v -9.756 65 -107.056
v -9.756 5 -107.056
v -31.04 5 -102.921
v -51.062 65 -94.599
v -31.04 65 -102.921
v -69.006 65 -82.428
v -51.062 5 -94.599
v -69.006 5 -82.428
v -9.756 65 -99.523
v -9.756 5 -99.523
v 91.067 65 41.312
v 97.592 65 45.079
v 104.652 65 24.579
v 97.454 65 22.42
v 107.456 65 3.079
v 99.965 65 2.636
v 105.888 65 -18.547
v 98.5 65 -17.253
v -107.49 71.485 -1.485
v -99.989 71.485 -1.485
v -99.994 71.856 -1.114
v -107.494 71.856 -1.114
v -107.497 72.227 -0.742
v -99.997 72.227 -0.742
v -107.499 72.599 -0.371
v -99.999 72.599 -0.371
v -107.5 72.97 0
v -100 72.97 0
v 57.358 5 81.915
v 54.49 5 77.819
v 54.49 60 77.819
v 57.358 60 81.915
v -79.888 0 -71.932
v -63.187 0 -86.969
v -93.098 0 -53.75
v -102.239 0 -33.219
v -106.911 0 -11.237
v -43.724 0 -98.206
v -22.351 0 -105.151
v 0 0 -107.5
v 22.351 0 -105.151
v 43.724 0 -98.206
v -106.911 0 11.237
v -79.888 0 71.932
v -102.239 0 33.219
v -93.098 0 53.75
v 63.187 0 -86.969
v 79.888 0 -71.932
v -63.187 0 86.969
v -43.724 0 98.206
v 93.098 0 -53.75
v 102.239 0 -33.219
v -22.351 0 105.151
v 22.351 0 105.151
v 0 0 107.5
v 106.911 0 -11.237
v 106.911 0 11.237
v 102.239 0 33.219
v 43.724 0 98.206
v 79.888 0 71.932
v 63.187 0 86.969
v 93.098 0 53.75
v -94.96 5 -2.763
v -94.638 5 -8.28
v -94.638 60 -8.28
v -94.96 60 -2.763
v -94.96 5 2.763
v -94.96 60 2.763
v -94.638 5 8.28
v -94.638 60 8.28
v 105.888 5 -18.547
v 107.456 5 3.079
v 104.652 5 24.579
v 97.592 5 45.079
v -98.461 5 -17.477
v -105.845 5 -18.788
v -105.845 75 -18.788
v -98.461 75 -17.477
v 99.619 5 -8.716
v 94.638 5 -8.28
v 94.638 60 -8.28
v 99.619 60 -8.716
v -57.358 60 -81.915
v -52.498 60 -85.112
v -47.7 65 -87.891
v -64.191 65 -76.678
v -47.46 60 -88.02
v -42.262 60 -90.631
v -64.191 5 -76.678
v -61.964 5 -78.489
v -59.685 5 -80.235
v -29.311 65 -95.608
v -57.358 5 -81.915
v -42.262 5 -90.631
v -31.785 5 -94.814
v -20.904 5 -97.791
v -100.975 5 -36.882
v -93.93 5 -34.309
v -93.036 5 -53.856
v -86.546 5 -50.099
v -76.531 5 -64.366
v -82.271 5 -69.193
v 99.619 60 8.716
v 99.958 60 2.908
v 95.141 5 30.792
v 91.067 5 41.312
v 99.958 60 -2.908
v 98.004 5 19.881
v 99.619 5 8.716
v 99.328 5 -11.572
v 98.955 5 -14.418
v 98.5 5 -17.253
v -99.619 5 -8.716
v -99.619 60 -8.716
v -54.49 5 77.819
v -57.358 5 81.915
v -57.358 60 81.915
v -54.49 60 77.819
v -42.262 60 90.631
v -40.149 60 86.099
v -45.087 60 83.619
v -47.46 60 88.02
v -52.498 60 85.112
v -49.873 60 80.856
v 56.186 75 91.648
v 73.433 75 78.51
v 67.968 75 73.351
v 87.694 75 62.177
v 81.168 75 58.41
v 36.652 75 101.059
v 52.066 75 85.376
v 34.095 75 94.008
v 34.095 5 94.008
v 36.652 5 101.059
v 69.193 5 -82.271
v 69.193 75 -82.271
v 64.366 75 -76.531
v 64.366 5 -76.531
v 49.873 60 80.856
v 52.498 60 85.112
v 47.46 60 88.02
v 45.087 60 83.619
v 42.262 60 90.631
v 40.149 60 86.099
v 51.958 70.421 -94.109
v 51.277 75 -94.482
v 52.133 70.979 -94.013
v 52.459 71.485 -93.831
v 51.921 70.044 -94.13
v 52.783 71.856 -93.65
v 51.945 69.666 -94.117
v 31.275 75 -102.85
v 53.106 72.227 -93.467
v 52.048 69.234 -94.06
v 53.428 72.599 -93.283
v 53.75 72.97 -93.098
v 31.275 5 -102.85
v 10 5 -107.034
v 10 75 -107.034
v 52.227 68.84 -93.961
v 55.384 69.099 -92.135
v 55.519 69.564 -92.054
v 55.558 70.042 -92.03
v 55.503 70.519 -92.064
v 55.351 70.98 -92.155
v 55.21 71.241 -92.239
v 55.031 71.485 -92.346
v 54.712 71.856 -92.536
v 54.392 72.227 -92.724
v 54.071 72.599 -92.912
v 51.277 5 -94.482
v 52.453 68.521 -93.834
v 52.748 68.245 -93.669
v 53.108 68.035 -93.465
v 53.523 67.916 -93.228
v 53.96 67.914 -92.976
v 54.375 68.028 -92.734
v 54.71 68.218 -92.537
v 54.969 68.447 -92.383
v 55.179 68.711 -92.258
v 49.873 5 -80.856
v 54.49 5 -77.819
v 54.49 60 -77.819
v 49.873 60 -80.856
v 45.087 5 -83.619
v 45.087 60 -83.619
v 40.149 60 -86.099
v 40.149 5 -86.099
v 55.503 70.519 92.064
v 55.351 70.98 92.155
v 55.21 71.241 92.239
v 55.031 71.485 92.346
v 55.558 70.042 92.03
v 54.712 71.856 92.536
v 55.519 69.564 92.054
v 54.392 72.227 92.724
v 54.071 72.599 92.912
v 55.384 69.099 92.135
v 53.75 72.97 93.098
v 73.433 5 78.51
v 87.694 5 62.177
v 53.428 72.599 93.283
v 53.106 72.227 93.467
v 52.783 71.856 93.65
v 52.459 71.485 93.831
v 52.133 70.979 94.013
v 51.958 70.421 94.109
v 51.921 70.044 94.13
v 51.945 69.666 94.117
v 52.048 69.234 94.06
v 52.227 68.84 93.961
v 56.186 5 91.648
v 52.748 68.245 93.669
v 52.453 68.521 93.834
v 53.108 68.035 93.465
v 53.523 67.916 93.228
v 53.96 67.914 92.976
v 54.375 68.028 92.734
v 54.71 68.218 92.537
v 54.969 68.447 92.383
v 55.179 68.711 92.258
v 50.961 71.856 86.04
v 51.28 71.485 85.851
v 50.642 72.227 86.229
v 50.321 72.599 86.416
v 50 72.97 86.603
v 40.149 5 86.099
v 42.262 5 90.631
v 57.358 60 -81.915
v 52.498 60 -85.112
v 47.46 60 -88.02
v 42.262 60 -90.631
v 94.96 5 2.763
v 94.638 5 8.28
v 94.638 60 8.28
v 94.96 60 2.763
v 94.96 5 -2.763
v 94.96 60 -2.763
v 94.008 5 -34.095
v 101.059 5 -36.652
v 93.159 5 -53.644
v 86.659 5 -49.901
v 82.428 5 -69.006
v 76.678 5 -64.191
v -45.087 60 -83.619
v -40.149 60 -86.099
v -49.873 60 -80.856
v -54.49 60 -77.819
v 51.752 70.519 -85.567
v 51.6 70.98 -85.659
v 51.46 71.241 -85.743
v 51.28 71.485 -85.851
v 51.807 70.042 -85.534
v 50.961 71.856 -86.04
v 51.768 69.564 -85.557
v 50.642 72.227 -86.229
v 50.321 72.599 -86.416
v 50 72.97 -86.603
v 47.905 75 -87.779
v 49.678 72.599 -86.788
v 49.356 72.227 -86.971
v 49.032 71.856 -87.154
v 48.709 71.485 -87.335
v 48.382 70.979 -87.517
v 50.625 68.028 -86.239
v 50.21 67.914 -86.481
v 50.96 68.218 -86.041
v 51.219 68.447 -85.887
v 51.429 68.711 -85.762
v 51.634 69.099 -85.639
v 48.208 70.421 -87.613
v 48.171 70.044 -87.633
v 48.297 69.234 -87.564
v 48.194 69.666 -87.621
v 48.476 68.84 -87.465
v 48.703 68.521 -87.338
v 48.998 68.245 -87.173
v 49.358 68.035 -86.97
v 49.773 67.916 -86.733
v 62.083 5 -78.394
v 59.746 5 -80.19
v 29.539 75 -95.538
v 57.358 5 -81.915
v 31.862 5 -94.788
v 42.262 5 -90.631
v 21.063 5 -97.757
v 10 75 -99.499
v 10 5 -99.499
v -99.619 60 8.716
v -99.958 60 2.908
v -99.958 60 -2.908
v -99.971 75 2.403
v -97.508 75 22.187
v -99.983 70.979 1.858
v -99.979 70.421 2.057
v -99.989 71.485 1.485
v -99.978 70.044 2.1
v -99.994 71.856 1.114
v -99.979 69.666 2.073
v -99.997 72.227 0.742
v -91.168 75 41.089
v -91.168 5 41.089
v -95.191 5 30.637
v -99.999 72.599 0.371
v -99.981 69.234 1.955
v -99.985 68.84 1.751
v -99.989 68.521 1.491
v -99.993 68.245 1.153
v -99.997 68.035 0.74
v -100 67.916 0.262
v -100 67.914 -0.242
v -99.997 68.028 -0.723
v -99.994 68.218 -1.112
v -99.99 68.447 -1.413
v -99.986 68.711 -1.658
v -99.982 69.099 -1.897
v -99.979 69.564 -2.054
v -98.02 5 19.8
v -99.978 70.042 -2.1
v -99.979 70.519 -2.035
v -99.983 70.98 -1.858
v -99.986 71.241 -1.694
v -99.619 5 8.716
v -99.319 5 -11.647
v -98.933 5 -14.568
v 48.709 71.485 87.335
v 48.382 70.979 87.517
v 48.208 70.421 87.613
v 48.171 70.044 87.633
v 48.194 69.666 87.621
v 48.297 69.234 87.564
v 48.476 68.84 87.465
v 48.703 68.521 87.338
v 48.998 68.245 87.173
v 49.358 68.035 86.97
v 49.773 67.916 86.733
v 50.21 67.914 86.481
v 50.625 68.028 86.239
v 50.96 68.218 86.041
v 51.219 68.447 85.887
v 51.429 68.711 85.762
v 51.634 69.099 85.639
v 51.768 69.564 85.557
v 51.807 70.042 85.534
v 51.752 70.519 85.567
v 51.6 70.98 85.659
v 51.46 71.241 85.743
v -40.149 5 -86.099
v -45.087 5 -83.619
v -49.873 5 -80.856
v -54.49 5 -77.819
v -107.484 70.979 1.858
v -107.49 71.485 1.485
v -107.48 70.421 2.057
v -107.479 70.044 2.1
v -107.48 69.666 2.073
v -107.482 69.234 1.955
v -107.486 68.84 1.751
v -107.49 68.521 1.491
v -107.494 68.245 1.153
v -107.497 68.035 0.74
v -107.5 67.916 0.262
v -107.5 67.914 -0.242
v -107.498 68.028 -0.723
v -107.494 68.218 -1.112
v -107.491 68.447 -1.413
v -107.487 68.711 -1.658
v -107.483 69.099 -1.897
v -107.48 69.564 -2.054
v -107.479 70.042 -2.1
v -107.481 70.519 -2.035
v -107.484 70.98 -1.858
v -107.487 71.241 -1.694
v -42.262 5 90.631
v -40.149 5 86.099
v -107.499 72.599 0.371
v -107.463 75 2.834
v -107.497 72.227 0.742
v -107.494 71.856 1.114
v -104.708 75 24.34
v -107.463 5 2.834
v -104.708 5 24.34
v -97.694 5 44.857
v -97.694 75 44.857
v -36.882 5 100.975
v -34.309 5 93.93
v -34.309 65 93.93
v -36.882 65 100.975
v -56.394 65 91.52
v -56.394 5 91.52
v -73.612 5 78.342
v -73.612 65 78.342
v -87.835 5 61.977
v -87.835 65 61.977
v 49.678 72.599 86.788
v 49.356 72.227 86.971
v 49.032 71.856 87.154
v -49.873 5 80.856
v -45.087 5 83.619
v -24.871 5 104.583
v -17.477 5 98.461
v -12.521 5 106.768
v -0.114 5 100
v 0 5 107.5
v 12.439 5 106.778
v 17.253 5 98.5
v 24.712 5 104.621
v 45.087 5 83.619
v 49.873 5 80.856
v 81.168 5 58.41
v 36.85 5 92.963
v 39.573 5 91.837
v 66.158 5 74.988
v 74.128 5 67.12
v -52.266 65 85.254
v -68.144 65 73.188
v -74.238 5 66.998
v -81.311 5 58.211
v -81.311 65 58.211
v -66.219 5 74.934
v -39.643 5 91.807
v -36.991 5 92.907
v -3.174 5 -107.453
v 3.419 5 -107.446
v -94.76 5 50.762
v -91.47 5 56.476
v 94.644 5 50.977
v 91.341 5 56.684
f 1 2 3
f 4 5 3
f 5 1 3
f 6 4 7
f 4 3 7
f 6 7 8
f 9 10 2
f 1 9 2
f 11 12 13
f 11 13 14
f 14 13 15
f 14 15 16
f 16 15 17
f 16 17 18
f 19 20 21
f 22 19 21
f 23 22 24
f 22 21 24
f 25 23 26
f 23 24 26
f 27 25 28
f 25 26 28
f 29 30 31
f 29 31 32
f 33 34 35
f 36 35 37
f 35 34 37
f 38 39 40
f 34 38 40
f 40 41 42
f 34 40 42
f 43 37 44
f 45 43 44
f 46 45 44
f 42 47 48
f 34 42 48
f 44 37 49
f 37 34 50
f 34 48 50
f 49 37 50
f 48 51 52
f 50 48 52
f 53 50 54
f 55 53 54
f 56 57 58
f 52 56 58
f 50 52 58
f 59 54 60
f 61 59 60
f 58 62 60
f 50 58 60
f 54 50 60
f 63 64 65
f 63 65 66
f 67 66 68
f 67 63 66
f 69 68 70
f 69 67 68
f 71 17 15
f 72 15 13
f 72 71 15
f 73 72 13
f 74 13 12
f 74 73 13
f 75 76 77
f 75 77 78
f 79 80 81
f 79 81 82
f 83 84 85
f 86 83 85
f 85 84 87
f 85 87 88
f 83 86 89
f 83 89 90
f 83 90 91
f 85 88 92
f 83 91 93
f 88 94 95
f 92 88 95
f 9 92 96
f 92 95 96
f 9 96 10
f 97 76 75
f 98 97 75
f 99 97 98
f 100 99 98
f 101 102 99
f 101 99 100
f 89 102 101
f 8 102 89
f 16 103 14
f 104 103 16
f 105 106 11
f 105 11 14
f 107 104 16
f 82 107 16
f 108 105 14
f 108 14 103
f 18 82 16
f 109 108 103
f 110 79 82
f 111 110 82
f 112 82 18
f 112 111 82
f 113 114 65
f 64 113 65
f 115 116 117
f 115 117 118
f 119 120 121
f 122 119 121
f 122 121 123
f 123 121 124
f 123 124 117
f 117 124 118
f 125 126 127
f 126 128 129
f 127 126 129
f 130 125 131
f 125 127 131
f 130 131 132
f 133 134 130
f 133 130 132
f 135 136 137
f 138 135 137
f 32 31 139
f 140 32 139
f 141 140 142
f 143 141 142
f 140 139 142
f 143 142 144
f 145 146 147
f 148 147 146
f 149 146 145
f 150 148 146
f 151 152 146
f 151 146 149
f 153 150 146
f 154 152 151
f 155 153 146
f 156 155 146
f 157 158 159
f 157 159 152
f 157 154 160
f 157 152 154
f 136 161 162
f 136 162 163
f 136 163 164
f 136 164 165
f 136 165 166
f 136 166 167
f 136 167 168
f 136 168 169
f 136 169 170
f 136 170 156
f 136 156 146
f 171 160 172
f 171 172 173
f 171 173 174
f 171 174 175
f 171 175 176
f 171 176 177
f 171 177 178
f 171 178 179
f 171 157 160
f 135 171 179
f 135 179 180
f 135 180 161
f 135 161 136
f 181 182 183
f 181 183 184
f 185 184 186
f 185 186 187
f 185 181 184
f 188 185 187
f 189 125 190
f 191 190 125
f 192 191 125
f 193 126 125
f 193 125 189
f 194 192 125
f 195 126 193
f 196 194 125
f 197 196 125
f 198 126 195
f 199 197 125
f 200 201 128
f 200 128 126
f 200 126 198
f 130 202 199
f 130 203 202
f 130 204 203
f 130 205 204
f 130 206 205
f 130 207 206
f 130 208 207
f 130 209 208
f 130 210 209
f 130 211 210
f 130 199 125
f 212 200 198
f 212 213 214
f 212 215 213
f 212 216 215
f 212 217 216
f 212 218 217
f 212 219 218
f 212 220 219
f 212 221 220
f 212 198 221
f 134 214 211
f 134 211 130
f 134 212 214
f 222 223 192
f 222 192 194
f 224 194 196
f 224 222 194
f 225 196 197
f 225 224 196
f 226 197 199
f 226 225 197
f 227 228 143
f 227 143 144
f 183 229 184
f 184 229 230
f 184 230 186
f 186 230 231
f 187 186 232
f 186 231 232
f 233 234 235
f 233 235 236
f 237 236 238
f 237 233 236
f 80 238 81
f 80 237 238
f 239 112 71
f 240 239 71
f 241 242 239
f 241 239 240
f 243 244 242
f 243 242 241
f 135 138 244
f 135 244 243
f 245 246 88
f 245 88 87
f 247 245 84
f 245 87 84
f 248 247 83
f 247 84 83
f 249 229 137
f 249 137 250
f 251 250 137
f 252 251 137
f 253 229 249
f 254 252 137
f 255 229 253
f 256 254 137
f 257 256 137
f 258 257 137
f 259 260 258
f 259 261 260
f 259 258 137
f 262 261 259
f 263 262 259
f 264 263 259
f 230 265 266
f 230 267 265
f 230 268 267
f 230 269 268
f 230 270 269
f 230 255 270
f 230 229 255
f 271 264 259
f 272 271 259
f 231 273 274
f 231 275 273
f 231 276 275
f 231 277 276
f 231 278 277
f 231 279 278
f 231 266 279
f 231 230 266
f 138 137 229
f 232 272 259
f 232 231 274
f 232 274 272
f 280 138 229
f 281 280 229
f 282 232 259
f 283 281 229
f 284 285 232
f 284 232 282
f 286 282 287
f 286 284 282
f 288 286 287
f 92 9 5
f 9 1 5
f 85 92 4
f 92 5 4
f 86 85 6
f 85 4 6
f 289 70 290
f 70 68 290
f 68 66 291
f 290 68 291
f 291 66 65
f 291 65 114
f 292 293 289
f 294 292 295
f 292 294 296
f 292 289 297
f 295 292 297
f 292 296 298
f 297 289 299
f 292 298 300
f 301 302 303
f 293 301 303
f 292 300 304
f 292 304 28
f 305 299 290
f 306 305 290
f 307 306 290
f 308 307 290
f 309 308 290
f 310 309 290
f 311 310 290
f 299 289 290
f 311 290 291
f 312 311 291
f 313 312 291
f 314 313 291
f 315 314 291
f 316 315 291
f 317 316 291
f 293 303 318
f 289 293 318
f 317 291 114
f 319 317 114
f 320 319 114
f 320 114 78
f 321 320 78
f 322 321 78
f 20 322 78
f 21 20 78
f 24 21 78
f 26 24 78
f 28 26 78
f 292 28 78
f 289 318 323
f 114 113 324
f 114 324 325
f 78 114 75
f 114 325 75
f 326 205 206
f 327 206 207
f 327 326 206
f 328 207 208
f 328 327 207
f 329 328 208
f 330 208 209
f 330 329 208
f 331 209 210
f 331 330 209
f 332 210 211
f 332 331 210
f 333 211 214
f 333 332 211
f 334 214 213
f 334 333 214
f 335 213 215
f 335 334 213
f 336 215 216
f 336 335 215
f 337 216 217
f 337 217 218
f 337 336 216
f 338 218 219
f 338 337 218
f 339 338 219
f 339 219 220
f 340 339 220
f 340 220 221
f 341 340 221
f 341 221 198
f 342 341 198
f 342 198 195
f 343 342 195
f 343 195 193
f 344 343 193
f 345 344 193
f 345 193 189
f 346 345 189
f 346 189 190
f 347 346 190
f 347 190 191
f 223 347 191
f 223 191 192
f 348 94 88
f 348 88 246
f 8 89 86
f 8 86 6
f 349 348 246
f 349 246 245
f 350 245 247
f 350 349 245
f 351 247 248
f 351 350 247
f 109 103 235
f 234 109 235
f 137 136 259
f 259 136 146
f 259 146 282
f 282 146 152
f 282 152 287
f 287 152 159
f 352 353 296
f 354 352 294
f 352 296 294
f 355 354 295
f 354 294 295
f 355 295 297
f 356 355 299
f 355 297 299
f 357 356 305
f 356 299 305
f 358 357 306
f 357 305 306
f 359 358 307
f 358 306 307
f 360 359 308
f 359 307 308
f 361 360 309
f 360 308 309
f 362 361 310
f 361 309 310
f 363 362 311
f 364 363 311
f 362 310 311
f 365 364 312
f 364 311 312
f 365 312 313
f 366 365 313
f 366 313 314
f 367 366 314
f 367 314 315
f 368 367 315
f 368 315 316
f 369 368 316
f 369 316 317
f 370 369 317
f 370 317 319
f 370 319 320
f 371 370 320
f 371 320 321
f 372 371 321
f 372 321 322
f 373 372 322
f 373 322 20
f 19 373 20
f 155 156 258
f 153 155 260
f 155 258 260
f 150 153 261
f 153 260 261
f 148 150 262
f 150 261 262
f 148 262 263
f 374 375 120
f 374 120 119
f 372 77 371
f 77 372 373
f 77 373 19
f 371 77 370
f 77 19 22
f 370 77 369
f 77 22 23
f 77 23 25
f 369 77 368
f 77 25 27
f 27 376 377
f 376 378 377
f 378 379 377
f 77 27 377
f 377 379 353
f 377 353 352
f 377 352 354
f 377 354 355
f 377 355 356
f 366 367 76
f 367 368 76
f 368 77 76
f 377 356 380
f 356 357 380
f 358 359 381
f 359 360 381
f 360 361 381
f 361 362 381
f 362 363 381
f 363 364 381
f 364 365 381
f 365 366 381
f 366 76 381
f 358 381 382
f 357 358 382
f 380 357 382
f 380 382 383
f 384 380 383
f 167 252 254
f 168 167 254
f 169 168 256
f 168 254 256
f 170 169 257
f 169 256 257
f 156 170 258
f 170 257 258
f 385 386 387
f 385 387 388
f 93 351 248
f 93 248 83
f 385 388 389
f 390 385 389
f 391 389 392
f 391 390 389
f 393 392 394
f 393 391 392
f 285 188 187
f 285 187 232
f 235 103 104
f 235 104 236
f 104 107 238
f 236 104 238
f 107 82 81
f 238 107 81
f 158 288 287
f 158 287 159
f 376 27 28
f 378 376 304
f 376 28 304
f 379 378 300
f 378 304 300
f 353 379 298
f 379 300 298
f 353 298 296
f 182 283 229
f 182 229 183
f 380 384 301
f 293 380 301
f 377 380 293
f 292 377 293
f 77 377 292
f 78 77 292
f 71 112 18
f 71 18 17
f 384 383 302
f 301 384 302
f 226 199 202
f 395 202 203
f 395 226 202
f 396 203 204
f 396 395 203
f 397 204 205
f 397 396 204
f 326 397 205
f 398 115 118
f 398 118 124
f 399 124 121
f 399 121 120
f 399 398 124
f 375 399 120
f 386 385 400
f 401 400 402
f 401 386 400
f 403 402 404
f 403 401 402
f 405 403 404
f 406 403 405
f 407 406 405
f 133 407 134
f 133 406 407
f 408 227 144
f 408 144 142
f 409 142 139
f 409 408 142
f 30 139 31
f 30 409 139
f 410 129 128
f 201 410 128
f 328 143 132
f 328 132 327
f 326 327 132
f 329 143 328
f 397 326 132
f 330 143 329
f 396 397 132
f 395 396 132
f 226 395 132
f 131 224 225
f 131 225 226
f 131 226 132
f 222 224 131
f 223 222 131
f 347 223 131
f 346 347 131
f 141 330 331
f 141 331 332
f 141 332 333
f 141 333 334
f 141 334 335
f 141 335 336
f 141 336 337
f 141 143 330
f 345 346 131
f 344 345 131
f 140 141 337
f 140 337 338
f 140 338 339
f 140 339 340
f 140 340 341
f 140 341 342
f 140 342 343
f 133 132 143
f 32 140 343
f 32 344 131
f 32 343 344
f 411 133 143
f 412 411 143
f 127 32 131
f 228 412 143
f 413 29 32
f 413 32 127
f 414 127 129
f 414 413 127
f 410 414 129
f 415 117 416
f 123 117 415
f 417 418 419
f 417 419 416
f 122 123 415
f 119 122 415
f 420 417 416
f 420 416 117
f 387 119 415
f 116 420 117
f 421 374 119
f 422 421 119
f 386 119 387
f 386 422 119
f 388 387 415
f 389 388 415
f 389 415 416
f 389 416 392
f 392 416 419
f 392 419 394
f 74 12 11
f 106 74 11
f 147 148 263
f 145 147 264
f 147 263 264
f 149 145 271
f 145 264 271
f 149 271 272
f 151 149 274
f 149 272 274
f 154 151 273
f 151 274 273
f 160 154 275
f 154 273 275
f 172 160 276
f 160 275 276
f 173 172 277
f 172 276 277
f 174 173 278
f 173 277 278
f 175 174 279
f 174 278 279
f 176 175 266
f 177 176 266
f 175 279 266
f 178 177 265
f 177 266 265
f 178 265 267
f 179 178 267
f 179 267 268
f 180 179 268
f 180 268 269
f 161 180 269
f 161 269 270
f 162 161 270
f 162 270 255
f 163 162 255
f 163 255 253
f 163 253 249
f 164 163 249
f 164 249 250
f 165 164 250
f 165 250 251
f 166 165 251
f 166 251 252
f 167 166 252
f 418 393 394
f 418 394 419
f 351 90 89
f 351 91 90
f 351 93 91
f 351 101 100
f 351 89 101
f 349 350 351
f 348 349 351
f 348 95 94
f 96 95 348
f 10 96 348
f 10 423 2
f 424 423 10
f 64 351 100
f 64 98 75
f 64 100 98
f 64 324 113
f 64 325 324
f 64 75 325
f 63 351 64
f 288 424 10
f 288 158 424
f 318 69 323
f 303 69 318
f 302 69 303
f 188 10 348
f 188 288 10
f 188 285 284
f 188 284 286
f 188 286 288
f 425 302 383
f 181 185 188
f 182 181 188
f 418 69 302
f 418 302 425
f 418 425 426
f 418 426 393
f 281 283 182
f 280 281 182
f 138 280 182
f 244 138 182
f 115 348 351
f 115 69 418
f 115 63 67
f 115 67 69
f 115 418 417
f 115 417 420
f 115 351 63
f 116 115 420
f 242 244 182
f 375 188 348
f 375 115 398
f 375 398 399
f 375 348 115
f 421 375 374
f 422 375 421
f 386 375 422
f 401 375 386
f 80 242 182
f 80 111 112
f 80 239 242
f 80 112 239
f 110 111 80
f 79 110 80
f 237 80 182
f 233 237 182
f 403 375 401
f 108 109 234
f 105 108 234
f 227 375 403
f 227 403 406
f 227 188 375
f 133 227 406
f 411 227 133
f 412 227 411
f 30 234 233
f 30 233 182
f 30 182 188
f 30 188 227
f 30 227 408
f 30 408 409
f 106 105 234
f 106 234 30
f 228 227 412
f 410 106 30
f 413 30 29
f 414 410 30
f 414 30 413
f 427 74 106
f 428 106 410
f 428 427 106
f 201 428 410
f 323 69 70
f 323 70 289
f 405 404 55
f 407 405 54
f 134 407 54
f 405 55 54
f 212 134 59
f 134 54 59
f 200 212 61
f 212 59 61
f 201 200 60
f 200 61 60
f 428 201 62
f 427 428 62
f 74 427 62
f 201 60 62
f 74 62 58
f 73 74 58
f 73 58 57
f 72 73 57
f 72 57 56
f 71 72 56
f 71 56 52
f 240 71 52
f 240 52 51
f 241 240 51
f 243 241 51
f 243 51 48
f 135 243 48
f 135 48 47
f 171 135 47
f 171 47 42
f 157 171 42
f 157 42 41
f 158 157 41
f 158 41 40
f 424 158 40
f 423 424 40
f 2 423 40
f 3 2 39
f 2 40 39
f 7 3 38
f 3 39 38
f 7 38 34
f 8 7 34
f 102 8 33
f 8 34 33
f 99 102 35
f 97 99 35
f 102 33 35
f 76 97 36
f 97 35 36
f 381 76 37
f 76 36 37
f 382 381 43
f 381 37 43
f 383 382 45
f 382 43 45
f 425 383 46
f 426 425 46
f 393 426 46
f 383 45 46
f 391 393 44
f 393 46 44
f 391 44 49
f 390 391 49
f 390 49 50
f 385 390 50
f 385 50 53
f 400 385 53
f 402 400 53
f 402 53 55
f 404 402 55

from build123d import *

# Parameters (mm, degrees)
SKETCH1_R               = 107.5
BOSS_EXTRUDE1_DEPTH     = 5
BOSS_EXTRUDE2_DEPTH     = 70
CUT_EXTRUDE2_DEPTH      = 10
CUT_EXTRUDE2_DEPTH_BACK = 10
BOSS_EXTRUDE4_DEPTH     = 55
CUT_EXTRUDE3_DEPTH      = 10
CUT_EXTRUDE3_DEPTH_BACK = 10
CUT_EXTRUDE4_DEPTH      = 10
CUT_EXTRUDE4_DEPTH_BACK = 10
CUT_EXTRUDE5_DEPTH      = 80
CUT_EXTRUDE6_START      = -10
CUT_EXTRUDE6_DEPTH      = 10


with BuildPart() as part:
    # Sketch1 → Boss-Extrude1 (new body)
    with BuildSketch(Plane(origin=(0, 0, 0), x_dir=(1, 0, 0), z_dir=(0, 1, 0))):
        Circle(SKETCH1_R)
    extrude(amount=BOSS_EXTRUDE1_DEPTH)

    # Sketch2 → Boss-Extrude2 (add)
    with BuildSketch(Plane(origin=(0, 5, 0), x_dir=(1, 0, 0), z_dir=(0, 1, 0))):
        with BuildLine():
            Line((-9.756097561, 99.522954942), (-9.756097561, 107.056380288))
            ThreePointArc((-9.756097561, 107.056380288), (-93.036435814, 53.856026692), (-97.694053207, -44.856682534))
            Line((-97.694053207, -44.856682534), (-91.168439698, -41.089117817))
            ThreePointArc((-91.168439698, -41.089117817), (-86.541200053, 50.106094373), (-9.756097561, 99.522954942))
        make_face()
        with BuildLine():
            Line((10, 99.498743711), (10, 107.033873143))
            ThreePointArc((10, 107.033873143), (93.158905169, 53.643903547), (97.591593747, -45.079161814))
            Line((97.591593747, -45.079161814), (91.06745602, -41.312449141))
            ThreePointArc((91.06745602, -41.312449141), (86.663750638, 49.893830534), (10, 99.498743711))
        make_face()
        with BuildLine():
            Line((81.168439698, -58.409625893), (87.694053207, -62.177190609))
            ThreePointArc((87.694053207, -62.177190609), (-0.122469355, -107.499930238), (-87.835496186, -61.977218474))
            Line((-87.835496186, -61.977218474), (-81.311358459, -58.210505801))
            ThreePointArc((-81.311358459, -58.210505801), (-0.122550585, -99.999924907), (81.168439698, -58.409625893))
        make_face()
    extrude(amount=BOSS_EXTRUDE2_DEPTH)

    # Sketch4 → Cut-Extrude2 (cut, two sides: drawn at the far end of the back side and taken through both)
    with BuildSketch(Plane.ZY.offset(107.5).offset(-CUT_EXTRUDE2_DEPTH_BACK)):
        with BuildLine():
            Line((-1.48492424, 71.48492424), (0, 72.969848481))
            Line((0, 72.969848481), (1.48492424, 71.48492424))
            ThreePointArc((1.48492424, 71.48492424), (0, 67.9), (-1.48492424, 71.48492424))
        make_face()
    extrude(amount=CUT_EXTRUDE2_DEPTH + CUT_EXTRUDE2_DEPTH_BACK, mode=Mode.SUBTRACT)

    # Sketch6 → Boss-Extrude4 (add)
    with BuildSketch(Plane(origin=(0, 5, 0), x_dir=(1, 0, 0), z_dir=(0, 1, 0))):
        with BuildLine():
            Line((94.638496319, 8.279795561), (99.619469809, 8.715574275))
            ThreePointArc((99.619469809, 8.715574275), (100, 0), (99.619469809, -8.715574275))
            Line((99.619469809, -8.715574275), (94.638496319, -8.279795561))
            ThreePointArc((94.638496319, -8.279795561), (95, 0), (94.638496319, 8.279795561))
        make_face()
        with BuildLine():
            Line((54.489761453, -77.819444207), (57.357643635, -81.915204429))
            ThreePointArc((57.357643635, -81.915204429), (50, -86.602540378), (42.261826174, -90.630778704))
            Line((42.261826174, -90.630778704), (40.148734865, -86.099239768))
            ThreePointArc((40.148734865, -86.099239768), (47.5, -82.27241336), (54.489761453, -77.819444207))
        make_face()
        with BuildLine():
            Line((-40.148734865, -86.099239768), (-42.261826174, -90.630778704))
            ThreePointArc((-42.261826174, -90.630778704), (-50, -86.602540378), (-57.357643635, -81.915204429))
            Line((-57.357643635, -81.915204429), (-54.489761453, -77.819444207))
            ThreePointArc((-54.489761453, -77.819444207), (-47.5, -82.27241336), (-40.148734865, -86.099239768))
        make_face()
        with BuildLine():
            Line((-94.638496319, -8.279795561), (-99.619469809, -8.715574275))
            ThreePointArc((-99.619469809, -8.715574275), (-100, 0), (-99.619469809, 8.715574275))
            Line((-99.619469809, 8.715574275), (-94.638496319, 8.279795561))
            ThreePointArc((-94.638496319, 8.279795561), (-95, 0), (-94.638496319, -8.279795561))
        make_face()
        with BuildLine():
            Line((-54.489761453, 77.819444207), (-57.357643635, 81.915204429))
            ThreePointArc((-57.357643635, 81.915204429), (-50, 86.602540378), (-42.261826174, 90.630778704))
            Line((-42.261826174, 90.630778704), (-40.148734865, 86.099239768))
            ThreePointArc((-40.148734865, 86.099239768), (-47.5, 82.27241336), (-54.489761453, 77.819444207))
        make_face()
        with BuildLine():
            Line((40.148734865, 86.099239768), (42.261826174, 90.630778704))
            ThreePointArc((42.261826174, 90.630778704), (50, 86.602540378), (57.357643635, 81.915204429))
            Line((57.357643635, 81.915204429), (54.489761453, 77.819444207))
            ThreePointArc((54.489761453, 77.819444207), (47.5, 82.27241336), (40.148734865, 86.099239768))
        make_face()
    extrude(amount=BOSS_EXTRUDE4_DEPTH)

    # Sketch7 → Cut-Extrude3 (cut, two sides: drawn at the far end of the back side and taken through both)
    with BuildSketch(Plane(origin=(53.75, 0, 93.097730907), x_dir=(0.8660254037844344, 0, -0.5000000000000075), z_dir=(0.5000000000000075, 0, 0.8660254037844344)).offset(-CUT_EXTRUDE3_DEPTH_BACK)):
        with BuildLine():
            Line((0, 72.969848481), (-1.48492424, 71.48492424))
            ThreePointArc((-1.48492424, 71.48492424), (0, 67.9), (1.48492424, 71.48492424))
            Line((1.48492424, 71.48492424), (0, 72.969848481))
        make_face()
    extrude(amount=CUT_EXTRUDE3_DEPTH + CUT_EXTRUDE3_DEPTH_BACK, mode=Mode.SUBTRACT)

    # Sketch8 → Cut-Extrude4 (cut, two sides: drawn at the far end of the back side and taken through both)
    with BuildSketch(Plane(origin=(53.75, 0, -93.097730907), x_dir=(-0.8660254037844379, 0, -0.5000000000000013), z_dir=(0.5000000000000012, 0, -0.8660254037844378)).offset(-CUT_EXTRUDE4_DEPTH_BACK)):
        with BuildLine():
            Line((-1.48492424, 71.48492424), (0, 72.969848481))
            Line((0, 72.969848481), (1.48492424, 71.48492424))
            ThreePointArc((1.48492424, 71.48492424), (0, 67.9), (-1.48492424, 71.48492424))
        make_face()
    extrude(amount=CUT_EXTRUDE4_DEPTH + CUT_EXTRUDE4_DEPTH_BACK, mode=Mode.SUBTRACT)

    # Sketch10 → Cut-Extrude5 (cut)
    with BuildSketch(Plane(origin=(0, 5, 0), x_dir=(1, 0, 0), z_dir=(0, 1, 0))):
        with BuildLine():
            Line((-34.309046601, -93.930236459), (-36.882225096, -100.975004194))
            ThreePointArc((-36.882225096, -100.975004194), (-0.122469355, -107.499930238), (36.652057999, -101.058778166))
            Line((36.652057999, -101.058778166), (34.094937673, -94.008165736))
            ThreePointArc((34.094937673, -94.008165736), (-0.113924981, -99.999935105), (-34.309046601, -93.930236459))
        make_face()
        with BuildLine():
            Line((-64.191447657, 76.677624166), (-69.005806231, 82.428445979))
            ThreePointArc((-69.005806231, 82.428445979), (-93.036435814, 53.856026692), (-105.845498167, 18.787775755))
            Line((-105.845498167, 18.787775755), (-98.460928527, 17.477000703))
            ThreePointArc((-98.460928527, 17.477000703), (-86.545521688, 50.09862948), (-64.191447657, 76.677624166))
        make_face()
        with BuildLine():
            Line((98.500494258, 17.252612293), (105.888031327, 18.546558215))
            ThreePointArc((105.888031327, 18.546558215), (93.158905169, 53.643903547), (69.193440168, 82.271002411))
            Line((69.193440168, 82.271002411), (64.365990854, 76.531165034))
            ThreePointArc((64.365990854, 76.531165034), (86.659446669, 49.901305625), (98.500494258, 17.252612293))
        make_face()
    extrude(amount=CUT_EXTRUDE5_DEPTH, mode=Mode.SUBTRACT)

    # Sketch11 → Cut-Extrude6 (cut)
    with BuildSketch(Plane(origin=(0, 75, 0), x_dir=(1, 0, 0), z_dir=(0, 1, 0)).offset(CUT_EXTRUDE6_START)):
        with BuildLine():
            Line((-64.191447657, 76.677624166), (-69.005806231, 82.428445979))
            ThreePointArc((-69.005806231, 82.428445979), (-41.261279177, 99.266091092), (-9.756097561, 107.056380288))
            Line((-9.756097561, 107.056380288), (-9.075439592, 99.587330501))
            ThreePointArc((-9.075439592, 99.587330501), (-38.382585281, 92.340549853), (-64.191447657, 76.677624166))
        make_face()
        with BuildLine():
            Line((98.500494258, 17.252612293), (105.888031327, 18.546558215))
            ThreePointArc((105.888031327, 18.546558215), (106.597596209, -13.899729586), (97.591593747, -45.079161814))
            Line((97.591593747, -45.079161814), (90.782877904, -41.934104013))
            ThreePointArc((90.782877904, -41.934104013), (99.160554613, -12.92998101), (98.500494258, 17.252612293))
        make_face()
        with BuildLine():
            Line((-34.309046601, -93.930236459), (-36.882225096, -100.975004194))
            ThreePointArc((-36.882225096, -100.975004194), (-65.336317032, -85.366361506), (-87.835496186, -61.977218474))
            Line((-87.835496186, -61.977218474), (-81.707438313, -57.653226487))
            ThreePointArc((-81.707438313, -57.653226487), (-60.777969332, -79.410568843), (-34.309046601, -93.930236459))
        make_face()
    extrude(amount=CUT_EXTRUDE6_DEPTH, mode=Mode.SUBTRACT)


solid = part.part
